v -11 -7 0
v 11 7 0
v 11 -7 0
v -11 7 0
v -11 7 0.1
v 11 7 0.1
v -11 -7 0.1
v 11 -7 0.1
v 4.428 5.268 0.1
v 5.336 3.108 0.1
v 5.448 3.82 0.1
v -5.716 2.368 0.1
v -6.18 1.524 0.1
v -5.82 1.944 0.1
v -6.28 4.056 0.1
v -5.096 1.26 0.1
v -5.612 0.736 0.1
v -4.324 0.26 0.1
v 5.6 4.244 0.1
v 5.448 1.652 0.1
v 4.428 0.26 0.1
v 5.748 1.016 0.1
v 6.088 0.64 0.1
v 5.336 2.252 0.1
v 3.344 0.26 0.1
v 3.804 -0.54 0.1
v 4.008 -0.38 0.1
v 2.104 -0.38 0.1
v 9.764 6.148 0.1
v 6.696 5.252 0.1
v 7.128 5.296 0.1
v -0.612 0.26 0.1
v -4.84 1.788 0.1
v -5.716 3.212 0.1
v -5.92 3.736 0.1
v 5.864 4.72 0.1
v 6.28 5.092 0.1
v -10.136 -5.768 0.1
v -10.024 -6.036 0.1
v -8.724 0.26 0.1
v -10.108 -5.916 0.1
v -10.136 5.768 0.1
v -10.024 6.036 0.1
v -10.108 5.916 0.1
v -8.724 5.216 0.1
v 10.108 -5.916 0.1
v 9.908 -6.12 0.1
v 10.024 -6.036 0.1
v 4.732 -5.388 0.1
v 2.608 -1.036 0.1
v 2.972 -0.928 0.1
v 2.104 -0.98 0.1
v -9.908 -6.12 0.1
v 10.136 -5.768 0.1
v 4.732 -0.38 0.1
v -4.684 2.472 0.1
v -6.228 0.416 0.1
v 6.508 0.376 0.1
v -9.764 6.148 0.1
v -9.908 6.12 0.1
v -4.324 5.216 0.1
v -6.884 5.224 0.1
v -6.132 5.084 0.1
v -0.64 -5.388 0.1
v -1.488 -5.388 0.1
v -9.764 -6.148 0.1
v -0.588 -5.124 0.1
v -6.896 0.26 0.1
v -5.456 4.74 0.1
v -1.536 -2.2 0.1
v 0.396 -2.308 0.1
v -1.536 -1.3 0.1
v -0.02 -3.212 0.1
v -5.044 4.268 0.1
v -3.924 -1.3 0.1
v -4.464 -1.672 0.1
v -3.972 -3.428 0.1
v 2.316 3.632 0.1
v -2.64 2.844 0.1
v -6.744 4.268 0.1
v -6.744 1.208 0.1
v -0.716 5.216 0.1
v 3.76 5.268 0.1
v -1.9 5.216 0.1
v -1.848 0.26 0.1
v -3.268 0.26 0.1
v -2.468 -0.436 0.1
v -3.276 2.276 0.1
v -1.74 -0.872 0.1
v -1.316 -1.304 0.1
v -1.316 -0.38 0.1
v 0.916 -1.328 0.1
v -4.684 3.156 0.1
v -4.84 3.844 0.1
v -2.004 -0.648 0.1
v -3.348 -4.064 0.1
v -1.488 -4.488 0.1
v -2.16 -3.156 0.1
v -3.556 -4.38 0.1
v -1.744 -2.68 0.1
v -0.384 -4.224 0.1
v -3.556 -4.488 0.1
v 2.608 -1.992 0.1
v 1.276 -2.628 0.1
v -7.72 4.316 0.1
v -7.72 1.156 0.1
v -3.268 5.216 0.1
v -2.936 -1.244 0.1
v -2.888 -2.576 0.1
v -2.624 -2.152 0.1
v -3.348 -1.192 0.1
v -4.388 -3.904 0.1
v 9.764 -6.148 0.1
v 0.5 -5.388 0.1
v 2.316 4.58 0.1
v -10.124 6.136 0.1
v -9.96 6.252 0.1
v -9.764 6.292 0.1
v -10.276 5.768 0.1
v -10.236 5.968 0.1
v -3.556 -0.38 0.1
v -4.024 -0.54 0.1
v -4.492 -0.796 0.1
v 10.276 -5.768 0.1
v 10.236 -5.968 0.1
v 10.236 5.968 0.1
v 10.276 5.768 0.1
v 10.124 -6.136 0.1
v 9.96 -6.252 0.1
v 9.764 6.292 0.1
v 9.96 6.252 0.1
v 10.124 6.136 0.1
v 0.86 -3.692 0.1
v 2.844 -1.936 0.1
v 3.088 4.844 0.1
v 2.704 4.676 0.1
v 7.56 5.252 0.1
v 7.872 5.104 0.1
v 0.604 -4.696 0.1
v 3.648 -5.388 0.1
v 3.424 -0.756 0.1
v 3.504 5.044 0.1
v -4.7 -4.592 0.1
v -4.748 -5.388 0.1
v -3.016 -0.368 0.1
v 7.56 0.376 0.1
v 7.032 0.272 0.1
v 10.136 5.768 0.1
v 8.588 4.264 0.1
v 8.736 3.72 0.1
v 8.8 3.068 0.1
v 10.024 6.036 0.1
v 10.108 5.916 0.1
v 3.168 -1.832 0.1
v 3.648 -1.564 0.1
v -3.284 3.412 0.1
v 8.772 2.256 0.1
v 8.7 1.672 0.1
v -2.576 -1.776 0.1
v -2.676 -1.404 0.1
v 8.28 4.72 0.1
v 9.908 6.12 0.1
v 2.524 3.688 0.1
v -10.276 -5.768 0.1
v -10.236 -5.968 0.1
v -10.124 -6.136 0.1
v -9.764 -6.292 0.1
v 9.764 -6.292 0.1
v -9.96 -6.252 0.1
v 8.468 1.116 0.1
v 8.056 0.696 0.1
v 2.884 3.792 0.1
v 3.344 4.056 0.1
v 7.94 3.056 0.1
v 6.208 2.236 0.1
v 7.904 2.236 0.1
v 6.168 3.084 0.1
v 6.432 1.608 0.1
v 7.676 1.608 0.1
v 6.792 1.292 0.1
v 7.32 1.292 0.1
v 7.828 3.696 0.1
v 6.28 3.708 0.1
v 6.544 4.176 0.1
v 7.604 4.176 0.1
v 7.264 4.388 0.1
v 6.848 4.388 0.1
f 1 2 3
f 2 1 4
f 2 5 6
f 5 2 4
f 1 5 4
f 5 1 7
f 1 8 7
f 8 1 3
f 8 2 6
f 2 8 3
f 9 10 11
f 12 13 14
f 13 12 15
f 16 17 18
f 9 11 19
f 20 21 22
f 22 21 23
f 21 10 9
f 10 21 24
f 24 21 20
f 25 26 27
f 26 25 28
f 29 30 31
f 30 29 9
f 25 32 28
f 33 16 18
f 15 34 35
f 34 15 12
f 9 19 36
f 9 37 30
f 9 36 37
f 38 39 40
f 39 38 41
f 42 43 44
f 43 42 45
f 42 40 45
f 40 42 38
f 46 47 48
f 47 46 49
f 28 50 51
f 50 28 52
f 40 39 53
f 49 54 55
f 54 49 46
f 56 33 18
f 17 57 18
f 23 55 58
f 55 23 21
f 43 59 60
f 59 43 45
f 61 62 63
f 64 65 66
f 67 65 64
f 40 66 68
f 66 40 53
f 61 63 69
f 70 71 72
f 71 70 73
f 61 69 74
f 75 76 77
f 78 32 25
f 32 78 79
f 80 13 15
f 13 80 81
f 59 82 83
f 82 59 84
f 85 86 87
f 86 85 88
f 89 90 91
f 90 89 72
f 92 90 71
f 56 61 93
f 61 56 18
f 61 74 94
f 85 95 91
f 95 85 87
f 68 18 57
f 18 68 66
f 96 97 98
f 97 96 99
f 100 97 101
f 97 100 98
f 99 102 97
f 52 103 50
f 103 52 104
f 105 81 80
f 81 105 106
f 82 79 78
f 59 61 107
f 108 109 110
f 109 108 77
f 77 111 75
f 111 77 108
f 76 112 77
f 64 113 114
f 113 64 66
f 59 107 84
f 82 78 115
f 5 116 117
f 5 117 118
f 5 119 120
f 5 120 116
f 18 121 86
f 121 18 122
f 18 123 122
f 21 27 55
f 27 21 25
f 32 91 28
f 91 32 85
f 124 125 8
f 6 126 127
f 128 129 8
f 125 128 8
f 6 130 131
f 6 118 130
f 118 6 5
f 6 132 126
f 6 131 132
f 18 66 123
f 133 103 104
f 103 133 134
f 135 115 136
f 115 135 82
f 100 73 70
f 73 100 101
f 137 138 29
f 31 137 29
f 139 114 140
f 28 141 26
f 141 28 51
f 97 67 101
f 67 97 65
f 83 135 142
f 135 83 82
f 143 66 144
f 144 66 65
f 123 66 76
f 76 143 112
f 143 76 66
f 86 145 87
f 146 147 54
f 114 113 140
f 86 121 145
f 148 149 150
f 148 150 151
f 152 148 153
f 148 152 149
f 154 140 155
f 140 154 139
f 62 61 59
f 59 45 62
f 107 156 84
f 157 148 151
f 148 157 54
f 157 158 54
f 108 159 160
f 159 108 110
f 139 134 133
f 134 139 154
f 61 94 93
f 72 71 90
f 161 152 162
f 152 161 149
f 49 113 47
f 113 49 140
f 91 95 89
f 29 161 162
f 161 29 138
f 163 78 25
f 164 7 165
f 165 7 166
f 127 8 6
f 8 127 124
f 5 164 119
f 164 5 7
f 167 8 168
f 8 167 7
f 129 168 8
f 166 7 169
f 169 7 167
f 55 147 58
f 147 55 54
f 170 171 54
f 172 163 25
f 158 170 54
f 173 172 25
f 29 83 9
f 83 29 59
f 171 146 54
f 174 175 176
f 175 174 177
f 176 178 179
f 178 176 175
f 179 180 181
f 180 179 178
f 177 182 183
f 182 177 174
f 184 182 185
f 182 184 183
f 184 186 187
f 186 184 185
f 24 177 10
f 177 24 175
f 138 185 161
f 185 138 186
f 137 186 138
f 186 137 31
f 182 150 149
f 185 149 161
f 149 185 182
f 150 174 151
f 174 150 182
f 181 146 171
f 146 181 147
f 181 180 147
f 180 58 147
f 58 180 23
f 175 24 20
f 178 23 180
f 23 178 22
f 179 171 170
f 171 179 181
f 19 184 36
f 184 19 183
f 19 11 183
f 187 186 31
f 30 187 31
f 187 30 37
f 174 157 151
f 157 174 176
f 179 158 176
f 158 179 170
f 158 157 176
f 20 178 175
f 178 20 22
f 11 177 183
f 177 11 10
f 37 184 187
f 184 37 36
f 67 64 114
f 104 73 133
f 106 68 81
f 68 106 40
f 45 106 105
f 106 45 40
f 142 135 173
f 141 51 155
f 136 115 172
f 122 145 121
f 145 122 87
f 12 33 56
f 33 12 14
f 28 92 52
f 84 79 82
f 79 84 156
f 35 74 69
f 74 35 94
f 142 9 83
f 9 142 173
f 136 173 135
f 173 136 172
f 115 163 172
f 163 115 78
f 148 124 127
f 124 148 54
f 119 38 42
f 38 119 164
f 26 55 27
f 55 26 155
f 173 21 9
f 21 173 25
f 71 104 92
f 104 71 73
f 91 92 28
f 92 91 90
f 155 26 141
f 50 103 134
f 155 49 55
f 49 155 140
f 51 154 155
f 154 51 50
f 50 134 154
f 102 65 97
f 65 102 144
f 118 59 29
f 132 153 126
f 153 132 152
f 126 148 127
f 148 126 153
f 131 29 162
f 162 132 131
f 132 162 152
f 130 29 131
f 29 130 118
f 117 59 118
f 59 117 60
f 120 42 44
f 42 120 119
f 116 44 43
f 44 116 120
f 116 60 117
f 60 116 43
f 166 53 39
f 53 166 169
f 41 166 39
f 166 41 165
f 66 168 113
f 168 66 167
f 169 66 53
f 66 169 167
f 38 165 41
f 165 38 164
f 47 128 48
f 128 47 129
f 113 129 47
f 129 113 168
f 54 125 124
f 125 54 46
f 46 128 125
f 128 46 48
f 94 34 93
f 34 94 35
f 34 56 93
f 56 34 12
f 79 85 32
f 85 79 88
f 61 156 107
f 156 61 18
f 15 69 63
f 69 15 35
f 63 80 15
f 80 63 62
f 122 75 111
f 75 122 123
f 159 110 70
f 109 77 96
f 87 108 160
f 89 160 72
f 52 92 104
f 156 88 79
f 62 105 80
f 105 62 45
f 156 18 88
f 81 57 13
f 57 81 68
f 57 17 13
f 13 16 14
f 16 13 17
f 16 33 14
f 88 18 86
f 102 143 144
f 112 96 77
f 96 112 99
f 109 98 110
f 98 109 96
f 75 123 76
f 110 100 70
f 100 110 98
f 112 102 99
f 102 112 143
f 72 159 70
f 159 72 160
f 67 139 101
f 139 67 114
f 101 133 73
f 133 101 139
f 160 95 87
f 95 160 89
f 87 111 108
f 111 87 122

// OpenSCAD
// file: ../p/box5-12.scad
use <../lib.scad>
function ldraw_lib__box5_12() = [
// 0 Box with 5 Faces without Any Edges
// 0 Name: box5-12.dat
// 0 Author: Chris Dee [cwdee]
// 0 !LDRAW_ORG Primitive UPDATE 2009-02
// 0 !LICENSE Licensed under CC BY 4.0 : see CAreadme.txt
// 
// 0 BFC CERTIFY CCW
  [0,"BFC","CERTIFY"],
  [0,"BFC","CCW"],
// 
// 0 !HISTORY 2009-09-03 [PTadmin] Official Update 2009-02
// 
// 
// 4 16 1 1 1 1 1 -1 -1 1 -1 -1 1 1
  [4,16,1,1,1,1,1,-1,-1,1,-1,-1,1,1],
// 4 16 -1 0 1 1 0 1 1 1 1 -1 1 1
  [4,16,-1,0,1,1,0,1,1,1,1,-1,1,1],
// 4 16 -1 0 -1 -1 0 1 -1 1 1 -1 1 -1
  [4,16,-1,0,-1,-1,0,1,-1,1,1,-1,1,-1],
// 4 16 1 0 -1 -1 0 -1 -1 1 -1 1 1 -1
  [4,16,1,0,-1,-1,0,-1,-1,1,-1,1,1,-1],
// 4 16 1 0 1 1 0 -1 1 1 -1 1 1 1
  [4,16,1,0,1,1,0,-1,1,1,-1,1,1,1],
// 0
];
module ldraw_lib__box5_12(step=0, col=false, unit=2/5, alt=false, line=0.2, solid=!$preview)
    makepoly(ldraw_lib__box5_12(), step=step, col=col, unit=unit, alt=alt, line=line, solid=solid);
ldraw_lib__box5_12(line=0.2);
// main file
use <../lib.scad>
use <../p/box5-12.scad>
function ldraw_lib__6296256o() = [
// 0 Sticker  1.8 x  2.8 with "DK 10 271" Licence Plate
// 0 Name: 6296256o.dat
// 0 Author: Magnus Forsberg [MagFors]
// 0 !LDRAW_ORG Part UPDATE 2022-05
// 0 !LICENSE Licensed under CC BY 4.0 : see CAreadme.txt
// 
// 0 BFC CERTIFY CCW
  [0,"BFC","CERTIFY"],
  [0,"BFC","CCW"],
// 
// 0 !KEYWORDS 500, Cinquecento, FIAT, Nuova, set 10271
// 
// 0 !HISTORY 2022-09-15 [PTadmin] Official Update 2022-05
// 
// 
// 1 16 0 -.25 0 27.5 0 0 0 .25 0 0 0 17.5 box5-12.dat
  [1,16,0,-.25,0,27.5,0,0,0,.25,0,0,0,17.5, ldraw_lib__box5_12()],
// 3 0 11.07 -.25 13.17 13.34 -.25 7.77 13.62 -.25 9.55
  [3,0,11.07,-.25,13.17,13.34,-.25,7.77,13.62,-.25,9.55],
// 4 0 -15.45 -.25 3.81 -14.55 -.25 4.86 -14.29 -.25 5.92 -15.7 -.25 10.14
  [4,0,-15.45,-.25,3.81,-14.55,-.25,4.86,-14.29,-.25,5.92,-15.7,-.25,10.14],
// 3 0 -12.74 -.25 3.15 -14.03 -.25 1.84 -10.81 -.25 .65
  [3,0,-12.74,-.25,3.15,-14.03,-.25,1.84,-10.81,-.25,.65],
// 3 0 11.07 -.25 13.17 13.62 -.25 9.55 14 -.25 10.61
  [3,0,11.07,-.25,13.17,13.62,-.25,9.55,14,-.25,10.61],
// 3 0 13.62 -.25 4.13 11.07 -.25 .65 14.37 -.25 2.54
  [3,0,13.62,-.25,4.13,11.07,-.25,.65,14.37,-.25,2.54],
// 3 0 14.37 -.25 2.54 11.07 -.25 .65 15.22 -.25 1.6
  [3,0,14.37,-.25,2.54,11.07,-.25,.65,15.22,-.25,1.6],
// 4 0 13.34 -.25 7.77 11.07 -.25 13.17 11.07 -.25 .65 13.34 -.25 5.63
  [4,0,13.34,-.25,7.77,11.07,-.25,13.17,11.07,-.25,.65,13.34,-.25,5.63],
// 3 0 13.34 -.25 5.63 11.07 -.25 .65 13.62 -.25 4.13
  [3,0,13.34,-.25,5.63,11.07,-.25,.65,13.62,-.25,4.13],
// 4 0 5.26 -.25 -.95 9.51 -.25 -1.35 10.02 -.25 -.95 8.36 -.25 .65
  [4,0,5.26,-.25,-.95,9.51,-.25,-1.35,10.02,-.25,-.95,8.36,-.25,.65],
// 4 0 24.41 -.25 15.37 11.07 -.25 13.17 16.74 -.25 13.13 17.82 -.25 13.24
  [4,0,24.41,-.25,15.37,11.07,-.25,13.17,16.74,-.25,13.13,17.82,-.25,13.24],
// 3 0 8.36 -.25 .65 -1.53 -.25 .65 5.26 -.25 -.95
  [3,0,8.36,-.25,.65,-1.53,-.25,.65,5.26,-.25,-.95],
// 3 0 -12.1 -.25 4.47 -12.74 -.25 3.15 -10.81 -.25 .65
  [3,0,-12.1,-.25,4.47,-12.74,-.25,3.15,-10.81,-.25,.65],
// 4 0 -14.29 -.25 8.03 -14.8 -.25 9.34 -15.7 -.25 10.14 -14.29 -.25 5.92
  [4,0,-14.29,-.25,8.03,-14.8,-.25,9.34,-15.7,-.25,10.14,-14.29,-.25,5.92],
// 3 0 11.07 -.25 13.17 14 -.25 10.61 14.66 -.25 11.8
  [3,0,11.07,-.25,13.17,14,-.25,10.61,14.66,-.25,11.8],
// 3 0 11.07 -.25 13.17 15.7 -.25 12.73 16.74 -.25 13.13
  [3,0,11.07,-.25,13.17,15.7,-.25,12.73,16.74,-.25,13.13],
// 3 0 11.07 -.25 13.17 14.66 -.25 11.8 15.7 -.25 12.73
  [3,0,11.07,-.25,13.17,14.66,-.25,11.8,15.7,-.25,12.73],
// 4 0 -21.81 -.25 .65 -25.34 -.25 -14.42 -25.27 -.25 -14.79 -25.06 -.25 -15.09
  [4,0,-21.81,-.25,.65,-25.34,-.25,-14.42,-25.27,-.25,-14.79,-25.06,-.25,-15.09],
// 4 0 -21.81 -.25 13.04 -25.06 -.25 15.09 -25.27 -.25 14.79 -25.34 -.25 14.42
  [4,0,-21.81,-.25,13.04,-25.06,-.25,15.09,-25.27,-.25,14.79,-25.34,-.25,14.42],
// 4 0 -21.81 -.25 13.04 -25.34 -.25 14.42 -25.34 -.25 -14.42 -21.81 -.25 .65
  [4,0,-21.81,-.25,13.04,-25.34,-.25,14.42,-25.34,-.25,-14.42,-21.81,-.25,.65],
// 4 0 25.06 -.25 -15.09 25.27 -.25 -14.79 11.83 -.25 -13.47 24.77 -.25 -15.3
  [4,0,25.06,-.25,-15.09,25.27,-.25,-14.79,11.83,-.25,-13.47,24.77,-.25,-15.3],
// 4 0 6.52 -.25 -2.59 7.43 -.25 -2.32 5.26 -.25 -.95 5.26 -.25 -2.45
  [4,0,6.52,-.25,-2.59,7.43,-.25,-2.32,5.26,-.25,-.95,5.26,-.25,-2.45],
// 3 0 -21.81 -.25 .65 -25.06 -.25 -15.09 -24.77 -.25 -15.3
  [3,0,-21.81,-.25,.65,-25.06,-.25,-15.09,-24.77,-.25,-15.3],
// 4 0 25.34 -.25 -14.42 11.83 -.25 -.95 11.83 -.25 -13.47 25.27 -.25 -14.79
  [4,0,25.34,-.25,-14.42,11.83,-.25,-.95,11.83,-.25,-13.47,25.27,-.25,-14.79],
// 3 0 -11.71 -.25 6.18 -12.1 -.25 4.47 -10.81 -.25 .65
  [3,0,-11.71,-.25,6.18,-12.1,-.25,4.47,-10.81,-.25,.65],
// 3 0 -14.03 -.25 1.84 -15.57 -.25 1.04 -10.81 -.25 .65
  [3,0,-14.03,-.25,1.84,-15.57,-.25,1.04,-10.81,-.25,.65],
// 4 0 16.27 -.25 .94 15.22 -.25 1.6 11.07 -.25 .65 11.83 -.25 -.95
  [4,0,16.27,-.25,.94,15.22,-.25,1.6,11.07,-.25,.65,11.83,-.25,-.95],
// 4 0 -21.81 -.25 13.04 -24.41 -.25 15.37 -24.77 -.25 15.3 -25.06 -.25 15.09
  [4,0,-21.81,-.25,13.04,-24.41,-.25,15.37,-24.77,-.25,15.3,-25.06,-.25,15.09],
// 3 0 -10.81 -.25 13.04 -17.21 -.25 13.06 -15.33 -.25 12.71
  [3,0,-10.81,-.25,13.04,-17.21,-.25,13.06,-15.33,-.25,12.71],
// 3 0 -1.6 -.25 -13.47 -3.72 -.25 -13.47 -24.41 -.25 -15.37
  [3,0,-1.6,-.25,-13.47,-3.72,-.25,-13.47,-24.41,-.25,-15.37],
// 3 0 -1.47 -.25 -12.81 -3.72 -.25 -13.47 -1.6 -.25 -13.47
  [3,0,-1.47,-.25,-12.81,-3.72,-.25,-13.47,-1.6,-.25,-13.47],
// 4 0 -24.41 -.25 -15.37 -17.24 -.25 .65 -21.81 -.25 .65 -24.77 -.25 -15.3
  [4,0,-24.41,-.25,-15.37,-17.24,-.25,.65,-21.81,-.25,.65,-24.77,-.25,-15.3],
// 3 0 -10.81 -.25 13.04 -15.33 -.25 12.71 -13.64 -.25 11.85
  [3,0,-10.81,-.25,13.04,-15.33,-.25,12.71,-13.64,-.25,11.85],
// 4 0 .99 -.25 -5.77 -3.84 -.25 -3.25 -3.84 -.25 -5.5 -.05 -.25 -8.03
  [4,0,.99,-.25,-5.77,-3.84,-.25,-3.25,-3.84,-.25,-5.5,-.05,-.25,-8.03],
// 3 0 -10.81 -.25 13.04 -13.64 -.25 11.85 -12.61 -.25 10.67
  [3,0,-10.81,-.25,13.04,-13.64,-.25,11.85,-12.61,-.25,10.67],
// 3 0 -9.81 -.25 -3.25 -11.16 -.25 -4.18 -9.93 -.25 -8.57
  [3,0,-9.81,-.25,-3.25,-11.16,-.25,-4.18,-9.93,-.25,-8.57],
// 4 0 8.36 -.25 .65 5.79 -.25 9.08 -6.6 -.25 7.11 -1.53 -.25 .65
  [4,0,8.36,-.25,.65,5.79,-.25,9.08,-6.6,-.25,7.11,-1.53,-.25,.65],
// 4 0 -15.45 -.25 3.81 -15.7 -.25 10.14 -16.86 -.25 10.67 -16.86 -.25 3.02
  [4,0,-15.45,-.25,3.81,-15.7,-.25,10.14,-16.86,-.25,10.67,-16.86,-.25,3.02],
// 4 0 -1.79 -.25 13.04 9.4 -.25 13.17 -24.41 -.25 15.37 -4.75 -.25 13.04
  [4,0,-1.79,-.25,13.04,9.4,-.25,13.17,-24.41,-.25,15.37,-4.75,-.25,13.04],
// 4 0 -4.62 -.25 .65 -8.19 -.25 5.69 -8.17 -.25 .65 -6.17 -.25 -1.09
  [4,0,-4.62,-.25,.65,-8.19,-.25,5.69,-8.17,-.25,.65,-6.17,-.25,-1.09],
// 4 0 -4.35 -.25 -2.18 -3.84 -.25 -3.25 -3.29 -.25 -3.26 -3.29 -.25 -.95
  [4,0,-4.35,-.25,-2.18,-3.84,-.25,-3.25,-3.29,-.25,-3.26,-3.29,-.25,-.95],
// 3 0 2.29 -.25 -3.32 -3.29 -.25 -3.26 .99 -.25 -5.77
  [3,0,2.29,-.25,-3.32,-3.29,-.25,-3.26,.99,-.25,-5.77],
// 4 0 -11.71 -.25 7.89 -11.71 -.25 6.18 -10.81 -.25 .65 -10.81 -.25 13.04
  [4,0,-11.71,-.25,7.89,-11.71,-.25,6.18,-10.81,-.25,.65,-10.81,-.25,13.04],
// 3 0 -10.81 -.25 13.04 -12.61 -.25 10.67 -12.1 -.25 9.61
  [3,0,-10.81,-.25,13.04,-12.61,-.25,10.67,-12.1,-.25,9.61],
// 4 0 -6.17 -.25 -1.09 -5.01 -.25 -1.62 -3.29 -.25 -.95 -4.62 -.25 .65
  [4,0,-6.17,-.25,-1.09,-5.01,-.25,-1.62,-3.29,-.25,-.95,-4.62,-.25,.65],
// 4 0 -10.81 -.25 .65 -15.57 -.25 1.04 -17.24 -.25 .65 -24.41 -.25 -15.37
  [4,0,-10.81,-.25,.65,-15.57,-.25,1.04,-17.24,-.25,.65,-24.41,-.25,-15.37],
// 4 0 -3.72 -.25 -11.22 -5.4 -.25 -7.89 -8.37 -.25 -10.16 -8.89 -.25 -10.95
  [4,0,-3.72,-.25,-11.22,-5.4,-.25,-7.89,-8.37,-.25,-10.16,-8.89,-.25,-10.95],
// 4 0 -4.36 -.25 -6.7 -5.4 -.25 -7.89 -3.72 -.25 -11.22 -.96 -.25 -10.56
  [4,0,-4.36,-.25,-6.7,-5.4,-.25,-7.89,-3.72,-.25,-11.22,-.96,-.25,-10.56],
// 3 0 -8.89 -.25 -10.95 -8.89 -.25 -11.22 -3.72 -.25 -11.22
  [3,0,-8.89,-.25,-10.95,-8.89,-.25,-11.22,-3.72,-.25,-11.22],
// 4 0 5.26 -.25 -2.45 3.19 -.25 -6.57 6.52 -.25 -4.98 6.52 -.25 -2.59
  [4,0,5.26,-.25,-2.45,3.19,-.25,-6.57,6.52,-.25,-4.98,6.52,-.25,-2.59],
// 4 0 -19.3 -.25 2.89 -16.86 -.25 3.02 -16.86 -.25 10.67 -19.3 -.25 10.79
  [4,0,-19.3,-.25,2.89,-16.86,-.25,3.02,-16.86,-.25,10.67,-19.3,-.25,10.79],
// 3 0 -1.79 -.25 13.04 -6.6 -.25 7.11 5.79 -.25 9.08
  [3,0,-1.79,-.25,13.04,-6.6,-.25,7.11,5.79,-.25,9.08],
// 3 0 -24.41 -.25 15.37 -10.81 -.25 13.04 -8.17 -.25 13.04
  [3,0,-24.41,-.25,15.37,-10.81,-.25,13.04,-8.17,-.25,13.04],
// 4 0 -7.34 -.25 -3.11 -9.93 -.25 -8.57 -7.22 -.25 -6.44 -6.56 -.25 -5.38
  [4,0,-7.34,-.25,-3.11,-9.93,-.25,-8.57,-7.22,-.25,-6.44,-6.56,-.25,-5.38],
// 4 0 -7.34 -.25 -3.11 -8.37 -.25 -2.98 -9.81 -.25 -3.25 -9.93 -.25 -8.57
  [4,0,-7.34,-.25,-3.11,-8.37,-.25,-2.98,-9.81,-.25,-3.25,-9.93,-.25,-8.57],
// 3 0 -11.16 -.25 -4.18 -10.97 -.25 -9.76 -9.93 -.25 -8.57
  [3,0,-11.16,-.25,-4.18,-10.97,-.25,-9.76,-9.93,-.25,-8.57],
// 4 0 -1.6 -.25 -13.47 -24.41 -.25 -15.37 24.41 -.25 -15.37 1.25 -.25 -13.47
  [4,0,-1.6,-.25,-13.47,-24.41,-.25,-15.37,24.41,-.25,-15.37,1.25,-.25,-13.47],
// 3 0 -24.41 -.25 15.37 -8.17 -.25 13.04 -4.75 -.25 13.04
  [3,0,-24.41,-.25,15.37,-8.17,-.25,13.04,-4.75,-.25,13.04],
// 3 0 -1.79 -.25 13.04 5.79 -.25 9.08 5.79 -.25 11.45
  [3,0,-1.79,-.25,13.04,5.79,-.25,9.08,5.79,-.25,11.45],
// 3 0 -27.5 -.25 17.5 -25.31 -.25 15.34 -24.9 -.25 15.63
  [3,0,-27.5,-.25,17.5,-25.31,-.25,15.34,-24.9,-.25,15.63],
// 3 0 -27.5 -.25 17.5 -24.9 -.25 15.63 -24.41 -.25 15.73
  [3,0,-27.5,-.25,17.5,-24.9,-.25,15.63,-24.41,-.25,15.73],
// 3 0 -27.5 -.25 17.5 -25.69 -.25 14.42 -25.59 -.25 14.92
  [3,0,-27.5,-.25,17.5,-25.69,-.25,14.42,-25.59,-.25,14.92],
// 3 0 -27.5 -.25 17.5 -25.59 -.25 14.92 -25.31 -.25 15.34
  [3,0,-27.5,-.25,17.5,-25.59,-.25,14.92,-25.31,-.25,15.34],
// 4 0 -8.89 -.25 -.95 -8.17 -.25 .65 -10.81 -.25 .65 -10.06 -.25 -1.35
  [4,0,-8.89,-.25,-.95,-8.17,-.25,.65,-10.81,-.25,.65,-10.06,-.25,-1.35],
// 3 0 -10.81 -.25 .65 -11.23 -.25 -1.99 -10.06 -.25 -1.35
  [3,0,-10.81,-.25,.65,-11.23,-.25,-1.99,-10.06,-.25,-1.35],
// 4 0 10.02 -.25 -.95 11.83 -.25 -.95 11.07 -.25 .65 8.36 -.25 .65
  [4,0,10.02,-.25,-.95,11.83,-.25,-.95,11.07,-.25,.65,8.36,-.25,.65],
// 4 0 -3.29 -.25 -.95 5.26 -.25 -.95 -1.53 -.25 .65 -4.62 -.25 .65
  [4,0,-3.29,-.25,-.95,5.26,-.25,-.95,-1.53,-.25,.65,-4.62,-.25,.65],
// 3 0 25.69 -.25 -14.42 25.59 -.25 -14.92 27.5 -.25 -17.5
  [3,0,25.69,-.25,-14.42,25.59,-.25,-14.92,27.5,-.25,-17.5],
// 3 0 27.5 -.25 17.5 25.59 -.25 14.92 25.69 -.25 14.42
  [3,0,27.5,-.25,17.5,25.59,-.25,14.92,25.69,-.25,14.42],
// 3 0 25.31 -.25 -15.34 24.9 -.25 -15.63 27.5 -.25 -17.5
  [3,0,25.31,-.25,-15.34,24.9,-.25,-15.63,27.5,-.25,-17.5],
// 3 0 25.59 -.25 -14.92 25.31 -.25 -15.34 27.5 -.25 -17.5
  [3,0,25.59,-.25,-14.92,25.31,-.25,-15.34,27.5,-.25,-17.5],
// 3 0 27.5 -.25 17.5 24.41 -.25 15.73 24.9 -.25 15.63
  [3,0,27.5,-.25,17.5,24.41,-.25,15.73,24.9,-.25,15.63],
// 4 0 24.41 -.25 15.73 27.5 -.25 17.5 -27.5 -.25 17.5 -24.41 -.25 15.73
  [4,0,24.41,-.25,15.73,27.5,-.25,17.5,-27.5,-.25,17.5,-24.41,-.25,15.73],
// 3 0 27.5 -.25 17.5 25.31 -.25 15.34 25.59 -.25 14.92
  [3,0,27.5,-.25,17.5,25.31,-.25,15.34,25.59,-.25,14.92],
// 3 0 27.5 -.25 17.5 24.9 -.25 15.63 25.31 -.25 15.34
  [3,0,27.5,-.25,17.5,24.9,-.25,15.63,25.31,-.25,15.34],
// 3 0 -10.81 -.25 .65 -24.41 -.25 -15.37 -11.23 -.25 -1.99
  [3,0,-10.81,-.25,.65,-24.41,-.25,-15.37,-11.23,-.25,-1.99],
// 4 0 7.11 -.25 -4.84 6.52 -.25 -4.98 3.19 -.25 -6.57 2.15 -.25 -9.23
  [4,0,7.11,-.25,-4.84,6.52,-.25,-4.98,3.19,-.25,-6.57,2.15,-.25,-9.23],
// 4 0 6.76 -.25 11.69 7.72 -.25 12.11 -1.79 -.25 13.04 5.79 -.25 11.45
  [4,0,6.76,-.25,11.69,7.72,-.25,12.11,-1.79,-.25,13.04,5.79,-.25,11.45],
// 4 0 -4.36 -.25 -6.7 -.96 -.25 -10.56 -.05 -.25 -8.03 -3.84 -.25 -5.5
  [4,0,-4.36,-.25,-6.7,-.96,-.25,-10.56,-.05,-.25,-8.03,-3.84,-.25,-5.5],
// 3 0 18.9 -.25 13.13 19.68 -.25 12.76 24.41 -.25 15.37
  [3,0,18.9,-.25,13.13,19.68,-.25,12.76,24.41,-.25,15.37],
// 3 0 17.82 -.25 13.24 18.9 -.25 13.13 24.41 -.25 15.37
  [3,0,17.82,-.25,13.24,18.9,-.25,13.13,24.41,-.25,15.37],
// 3 0 1.51 -.25 -11.74 1.25 -.25 -13.47 9.12 -.25 -13.47
  [3,0,1.51,-.25,-11.74,1.25,-.25,-13.47,9.12,-.25,-13.47],
// 4 0 5.26 -.25 -.95 7.43 -.25 -2.32 8.56 -.25 -1.89 9.51 -.25 -1.35
  [4,0,5.26,-.25,-.95,7.43,-.25,-2.32,8.56,-.25,-1.89,9.51,-.25,-1.35],
// 4 0 -1.47 -.25 -12.81 -.96 -.25 -10.56 -3.72 -.25 -11.22 -3.72 -.25 -13.47
  [4,0,-1.47,-.25,-12.81,-.96,-.25,-10.56,-3.72,-.25,-11.22,-3.72,-.25,-13.47],
// 4 0 8.76 -.25 12.61 9.4 -.25 13.17 -1.79 -.25 13.04 7.72 -.25 12.11
  [4,0,8.76,-.25,12.61,9.4,-.25,13.17,-1.79,-.25,13.04,7.72,-.25,12.11],
// 3 0 -11.75 -.25 -11.48 -24.41 -.25 -15.37 -11.87 -.25 -13.47
  [3,0,-11.75,-.25,-11.48,-24.41,-.25,-15.37,-11.87,-.25,-13.47],
// 3 0 -11.87 -.25 -13.47 -24.41 -.25 -15.37 -3.72 -.25 -13.47
  [3,0,-11.87,-.25,-13.47,-24.41,-.25,-15.37,-3.72,-.25,-13.47],
// 3 0 -11.23 -.25 -1.99 -24.41 -.25 -15.37 -11.16 -.25 -4.18
  [3,0,-11.23,-.25,-1.99,-24.41,-.25,-15.37,-11.16,-.25,-4.18],
// 4 0 -10.97 -.25 -9.76 -11.16 -.25 -4.18 -24.41 -.25 -15.37 -11.75 -.25 -11.48
  [4,0,-10.97,-.25,-9.76,-11.16,-.25,-4.18,-24.41,-.25,-15.37,-11.75,-.25,-11.48],
// 3 0 -8.17 -.25 .65 -7.54 -.25 -.92 -6.17 -.25 -1.09
  [3,0,-8.17,-.25,.65,-7.54,-.25,-.92,-6.17,-.25,-1.09],
// 3 0 18.9 -.25 .94 17.58 -.25 .68 25.34 -.25 -14.42
  [3,0,18.9,-.25,.94,17.58,-.25,.68,25.34,-.25,-14.42],
// 3 0 1.25 -.25 -13.47 24.41 -.25 -15.37 9.12 -.25 -13.47
  [3,0,1.25,-.25,-13.47,24.41,-.25,-15.37,9.12,-.25,-13.47],
// 3 0 -8.17 -.25 .65 -8.89 -.25 -.95 -7.54 -.25 -.92
  [3,0,-8.17,-.25,.65,-8.89,-.25,-.95,-7.54,-.25,-.92],
// 3 0 25.34 -.25 14.42 21.47 -.25 10.66 21.84 -.25 9.3
  [3,0,25.34,-.25,14.42,21.47,-.25,10.66,21.84,-.25,9.3],
// 3 0 25.34 -.25 14.42 21.84 -.25 9.3 22 -.25 7.67
  [3,0,25.34,-.25,14.42,21.84,-.25,9.3,22,-.25,7.67],
// 4 0 25.27 -.25 14.79 25.06 -.25 15.09 21.47 -.25 10.66 25.34 -.25 14.42
  [4,0,25.27,-.25,14.79,25.06,-.25,15.09,21.47,-.25,10.66,25.34,-.25,14.42],
// 4 0 1.51 -.25 -11.74 9.12 -.25 -13.47 9.12 -.25 -3.91 7.92 -.25 -4.58
  [4,0,1.51,-.25,-11.74,9.12,-.25,-13.47,9.12,-.25,-3.91,7.92,-.25,-4.58],
// 3 0 -17.21 -.25 13.06 -10.81 -.25 13.04 -24.41 -.25 15.37
  [3,0,-17.21,-.25,13.06,-10.81,-.25,13.04,-24.41,-.25,15.37],
// 3 0 -24.41 -.25 15.37 -21.81 -.25 13.04 -17.21 -.25 13.06
  [3,0,-24.41,-.25,15.37,-21.81,-.25,13.04,-17.21,-.25,13.06],
// 3 0 -8.17 -.25 13.04 -8.21 -.25 8.53 -4.75 -.25 13.04
  [3,0,-8.17,-.25,13.04,-8.21,-.25,8.53,-4.75,-.25,13.04],
// 4 0 25.34 -.25 14.42 22 -.25 7.67 21.93 -.25 5.64 25.34 -.25 -14.42
  [4,0,25.34,-.25,14.42,22,-.25,7.67,21.93,-.25,5.64,25.34,-.25,-14.42],
// 3 0 21.93 -.25 5.64 21.75 -.25 4.18 25.34 -.25 -14.42
  [3,0,21.93,-.25,5.64,21.75,-.25,4.18,25.34,-.25,-14.42],
// 4 0 -6.44 -.25 -4.44 -6.69 -.25 -3.51 -7.34 -.25 -3.11 -6.56 -.25 -5.38
  [4,0,-6.44,-.25,-4.44,-6.69,-.25,-3.51,-7.34,-.25,-3.11,-6.56,-.25,-5.38],
// 4 0 2.15 -.25 -9.23 1.51 -.25 -11.74 7.92 -.25 -4.58 7.11 -.25 -4.84
  [4,0,2.15,-.25,-9.23,1.51,-.25,-11.74,7.92,-.25,-4.58,7.11,-.25,-4.84],
// 3 0 -10.81 -.25 13.04 -12.1 -.25 9.61 -11.71 -.25 7.89
  [3,0,-10.81,-.25,13.04,-12.1,-.25,9.61,-11.71,-.25,7.89],
// 3 0 -3.84 -.25 -3.25 .99 -.25 -5.77 -3.29 -.25 -3.26
  [3,0,-3.84,-.25,-3.25,.99,-.25,-5.77,-3.29,-.25,-3.26],
// 4 0 25.06 -.25 15.09 24.77 -.25 15.3 20.7 -.25 11.8 21.47 -.25 10.66
  [4,0,25.06,-.25,15.09,24.77,-.25,15.3,20.7,-.25,11.8,21.47,-.25,10.66],
// 4 0 11.83 -.25 -13.47 9.12 -.25 -13.47 24.41 -.25 -15.37 24.77 -.25 -15.3
  [4,0,11.83,-.25,-13.47,9.12,-.25,-13.47,24.41,-.25,-15.37,24.77,-.25,-15.3],
// 3 0 -3.29 -.25 -.95 -5.01 -.25 -1.62 -4.35 -.25 -2.18
  [3,0,-3.29,-.25,-.95,-5.01,-.25,-1.62,-4.35,-.25,-2.18],
// 4 0 24.41 -.25 15.37 19.68 -.25 12.76 20.7 -.25 11.8 24.77 -.25 15.3
  [4,0,24.41,-.25,15.37,19.68,-.25,12.76,20.7,-.25,11.8,24.77,-.25,15.3],
// 3 0 6.31 -.25 9.22 5.79 -.25 9.08 8.36 -.25 .65
  [3,0,6.31,-.25,9.22,5.79,-.25,9.08,8.36,-.25,.65],
// 3 0 -25.69 -.25 -14.42 -27.5 -.25 -17.5 -25.59 -.25 -14.92
  [3,0,-25.69,-.25,-14.42,-27.5,-.25,-17.5,-25.59,-.25,-14.92],
// 3 0 -25.59 -.25 -14.92 -27.5 -.25 -17.5 -25.31 -.25 -15.34
  [3,0,-25.59,-.25,-14.92,-27.5,-.25,-17.5,-25.31,-.25,-15.34],
// 4 0 25.69 -.25 14.42 25.69 -.25 -14.42 27.5 -.25 -17.5 27.5 -.25 17.5
  [4,0,25.69,-.25,14.42,25.69,-.25,-14.42,27.5,-.25,-17.5,27.5,-.25,17.5],
// 4 0 -25.69 -.25 -14.42 -25.69 -.25 14.42 -27.5 -.25 17.5 -27.5 -.25 -17.5
  [4,0,-25.69,-.25,-14.42,-25.69,-.25,14.42,-27.5,-.25,17.5,-27.5,-.25,-17.5],
// 4 0 -27.5 -.25 -17.5 27.5 -.25 -17.5 24.41 -.25 -15.73 -24.41 -.25 -15.73
  [4,0,-27.5,-.25,-17.5,27.5,-.25,-17.5,24.41,-.25,-15.73,-24.41,-.25,-15.73],
// 3 0 24.9 -.25 -15.63 24.41 -.25 -15.73 27.5 -.25 -17.5
  [3,0,24.9,-.25,-15.63,24.41,-.25,-15.73,27.5,-.25,-17.5],
// 3 0 -25.31 -.25 -15.34 -27.5 -.25 -17.5 -24.9 -.25 -15.63
  [3,0,-25.31,-.25,-15.34,-27.5,-.25,-17.5,-24.9,-.25,-15.63],
// 3 0 -24.9 -.25 -15.63 -27.5 -.25 -17.5 -24.41 -.25 -15.73
  [3,0,-24.9,-.25,-15.63,-27.5,-.25,-17.5,-24.41,-.25,-15.73],
// 4 0 16.27 -.25 .94 11.83 -.25 -.95 25.34 -.25 -14.42 17.58 -.25 .68
  [4,0,16.27,-.25,.94,11.83,-.25,-.95,25.34,-.25,-14.42,17.58,-.25,.68],
// 3 0 21.17 -.25 2.79 20.14 -.25 1.74 25.34 -.25 -14.42
  [3,0,21.17,-.25,2.79,20.14,-.25,1.74,25.34,-.25,-14.42],
// 3 0 7.21 -.25 9.48 6.31 -.25 9.22 8.36 -.25 .65
  [3,0,7.21,-.25,9.48,6.31,-.25,9.22,8.36,-.25,.65],
// 3 0 21.75 -.25 4.18 21.17 -.25 2.79 25.34 -.25 -14.42
  [3,0,21.75,-.25,4.18,21.17,-.25,2.79,25.34,-.25,-14.42],
// 3 0 8.36 -.25 10.14 7.21 -.25 9.48 8.36 -.25 .65
  [3,0,8.36,-.25,10.14,7.21,-.25,9.48,8.36,-.25,.65],
// 4 0 11.07 -.25 13.17 24.41 -.25 15.37 -24.41 -.25 15.37 9.4 -.25 13.17
  [4,0,11.07,-.25,13.17,24.41,-.25,15.37,-24.41,-.25,15.37,9.4,-.25,13.17],
// 3 0 20.14 -.25 1.74 18.9 -.25 .94 25.34 -.25 -14.42
  [3,0,20.14,-.25,1.74,18.9,-.25,.94,25.34,-.25,-14.42],
// 4 0 19.85 -.25 7.64 15.42 -.25 7.71 15.52 -.25 5.59 19.76 -.25 5.59
  [4,0,19.85,-.25,7.64,15.42,-.25,7.71,15.52,-.25,5.59,19.76,-.25,5.59],
// 4 0 19.76 -.25 5.59 15.52 -.25 5.59 16.08 -.25 4.02 19.19 -.25 4.02
  [4,0,19.76,-.25,5.59,15.52,-.25,5.59,16.08,-.25,4.02,19.19,-.25,4.02],
// 4 0 16.98 -.25 3.23 18.3 -.25 3.23 19.19 -.25 4.02 16.08 -.25 4.02
  [4,0,16.98,-.25,3.23,18.3,-.25,3.23,19.19,-.25,4.02,16.08,-.25,4.02],
// 4 0 15.42 -.25 7.71 19.85 -.25 7.64 19.57 -.25 9.24 15.7 -.25 9.27
  [4,0,15.42,-.25,7.71,19.85,-.25,7.64,19.57,-.25,9.24,15.7,-.25,9.27],
// 4 0 16.36 -.25 10.44 15.7 -.25 9.27 19.57 -.25 9.24 19.01 -.25 10.44
  [4,0,16.36,-.25,10.44,15.7,-.25,9.27,19.57,-.25,9.24,19.01,-.25,10.44],
// 4 0 17.12 -.25 10.97 16.36 -.25 10.44 19.01 -.25 10.44 18.16 -.25 10.97
  [4,0,17.12,-.25,10.97,16.36,-.25,10.44,19.01,-.25,10.44,18.16,-.25,10.97],
// 4 15 15.52 -.25 5.59 15.42 -.25 7.71 13.34 -.25 7.77 13.34 -.25 5.63
  [4,15,15.52,-.25,5.59,15.42,-.25,7.71,13.34,-.25,7.77,13.34,-.25,5.63],
// 4 15 20.7 -.25 11.8 19.68 -.25 12.76 18.16 -.25 10.97 19.01 -.25 10.44
  [4,15,20.7,-.25,11.8,19.68,-.25,12.76,18.16,-.25,10.97,19.01,-.25,10.44],
// 4 15 17.82 -.25 13.24 18.16 -.25 10.97 19.68 -.25 12.76 18.9 -.25 13.13
  [4,15,17.82,-.25,13.24,18.16,-.25,10.97,19.68,-.25,12.76,18.9,-.25,13.13],
// 3 15 19.57 -.25 9.24 21.84 -.25 9.3 21.47 -.25 10.66
  [3,15,19.57,-.25,9.24,21.84,-.25,9.3,21.47,-.25,10.66],
// 4 15 21.47 -.25 10.66 20.7 -.25 11.8 19.01 -.25 10.44 19.57 -.25 9.24
  [4,15,21.47,-.25,10.66,20.7,-.25,11.8,19.01,-.25,10.44,19.57,-.25,9.24],
// 4 15 22 -.25 7.67 21.84 -.25 9.3 19.57 -.25 9.24 19.85 -.25 7.64
  [4,15,22,-.25,7.67,21.84,-.25,9.3,19.57,-.25,9.24,19.85,-.25,7.64],
// 4 15 20.14 -.25 1.74 18.3 -.25 3.23 17.58 -.25 .68 18.9 -.25 .94
  [4,15,20.14,-.25,1.74,18.3,-.25,3.23,17.58,-.25,.68,18.9,-.25,.94],
// 3 15 18.3 -.25 3.23 16.98 -.25 3.23 17.58 -.25 .68
  [3,15,18.3,-.25,3.23,16.98,-.25,3.23,17.58,-.25,.68],
// 4 15 17.58 -.25 .68 16.98 -.25 3.23 15.22 -.25 1.6 16.27 -.25 .94
  [4,15,17.58,-.25,.68,16.98,-.25,3.23,15.22,-.25,1.6,16.27,-.25,.94],
// 3 15 15.52 -.25 5.59 13.34 -.25 5.63 13.62 -.25 4.13
  [3,15,15.52,-.25,5.59,13.34,-.25,5.63,13.62,-.25,4.13],
// 4 15 15.22 -.25 1.6 16.98 -.25 3.23 16.08 -.25 4.02 14.37 -.25 2.54
  [4,15,15.22,-.25,1.6,16.98,-.25,3.23,16.08,-.25,4.02,14.37,-.25,2.54],
// 4 15 18.3 -.25 3.23 20.14 -.25 1.74 21.17 -.25 2.79 19.19 -.25 4.02
  [4,15,18.3,-.25,3.23,20.14,-.25,1.74,21.17,-.25,2.79,19.19,-.25,4.02],
// 4 15 16.36 -.25 10.44 14.66 -.25 11.8 14 -.25 10.61 15.7 -.25 9.27
  [4,15,16.36,-.25,10.44,14.66,-.25,11.8,14,-.25,10.61,15.7,-.25,9.27],
// 3 15 14 -.25 10.61 13.62 -.25 9.55 15.7 -.25 9.27
  [3,15,14,-.25,10.61,13.62,-.25,9.55,15.7,-.25,9.27],
// 3 15 17.12 -.25 10.97 18.16 -.25 10.97 17.82 -.25 13.24
  [3,15,17.12,-.25,10.97,18.16,-.25,10.97,17.82,-.25,13.24],
// 4 15 17.82 -.25 13.24 16.74 -.25 13.13 15.7 -.25 12.73 17.12 -.25 10.97
  [4,15,17.82,-.25,13.24,16.74,-.25,13.13,15.7,-.25,12.73,17.12,-.25,10.97],
// 4 15 19.85 -.25 7.64 19.76 -.25 5.59 21.93 -.25 5.64 22 -.25 7.67
  [4,15,19.85,-.25,7.64,19.76,-.25,5.59,21.93,-.25,5.64,22,-.25,7.67],
// 4 15 19.19 -.25 4.02 21.17 -.25 2.79 21.75 -.25 4.18 19.76 -.25 5.59
  [4,15,19.19,-.25,4.02,21.17,-.25,2.79,21.75,-.25,4.18,19.76,-.25,5.59],
// 3 15 21.75 -.25 4.18 21.93 -.25 5.64 19.76 -.25 5.59
  [3,15,21.75,-.25,4.18,21.93,-.25,5.64,19.76,-.25,5.59],
// 4 15 13.62 -.25 4.13 14.37 -.25 2.54 16.08 -.25 4.02 15.52 -.25 5.59
  [4,15,13.62,-.25,4.13,14.37,-.25,2.54,16.08,-.25,4.02,15.52,-.25,5.59],
// 4 15 13.34 -.25 7.77 15.42 -.25 7.71 15.7 -.25 9.27 13.62 -.25 9.55
  [4,15,13.34,-.25,7.77,15.42,-.25,7.71,15.7,-.25,9.27,13.62,-.25,9.55],
// 4 15 14.66 -.25 11.8 16.36 -.25 10.44 17.12 -.25 10.97 15.7 -.25 12.73
  [4,15,14.66,-.25,11.8,16.36,-.25,10.44,17.12,-.25,10.97,15.7,-.25,12.73],
// 3 15 -1.47 -.25 -12.81 -1.6 -.25 -13.47 1.25 -.25 -13.47
  [3,15,-1.47,-.25,-12.81,-1.6,-.25,-13.47,1.25,-.25,-13.47],
// 3 15 3.19 -.25 -6.57 -.05 -.25 -8.03 2.15 -.25 -9.23
  [3,15,3.19,-.25,-6.57,-.05,-.25,-8.03,2.15,-.25,-9.23],
// 4 15 -19.3 -.25 2.89 -21.81 -.25 .65 -17.24 -.25 .65 -16.86 -.25 3.02
  [4,15,-19.3,-.25,2.89,-21.81,-.25,.65,-17.24,-.25,.65,-16.86,-.25,3.02],
// 4 15 -21.81 -.25 13.04 -21.81 -.25 .65 -19.3 -.25 2.89 -19.3 -.25 10.79
  [4,15,-21.81,-.25,13.04,-21.81,-.25,.65,-19.3,-.25,2.89,-19.3,-.25,10.79],
// 3 15 8.76 -.25 12.61 7.72 -.25 12.11 8.36 -.25 10.14
  [3,15,8.76,-.25,12.61,7.72,-.25,12.11,8.36,-.25,10.14],
// 3 15 8.56 -.25 -1.89 7.43 -.25 -2.32 9.12 -.25 -3.91
  [3,15,8.56,-.25,-1.89,7.43,-.25,-2.32,9.12,-.25,-3.91],
// 3 15 6.76 -.25 11.69 5.79 -.25 11.45 7.21 -.25 9.48
  [3,15,6.76,-.25,11.69,5.79,-.25,11.45,7.21,-.25,9.48],
// 4 15 -7.54 -.25 -.92 -8.89 -.25 -.95 -10.06 -.25 -1.35 -6.17 -.25 -1.09
  [4,15,-7.54,-.25,-.92,-8.89,-.25,-.95,-10.06,-.25,-1.35,-6.17,-.25,-1.09],
// 4 15 -14.55 -.25 4.86 -12.1 -.25 4.47 -11.71 -.25 6.18 -14.29 -.25 5.92
  [4,15,-14.55,-.25,4.86,-12.1,-.25,4.47,-11.71,-.25,6.18,-14.29,-.25,5.92],
// 3 15 5.26 -.25 -.95 2.29 -.25 -3.32 5.26 -.25 -2.45
  [3,15,5.26,-.25,-.95,2.29,-.25,-3.32,5.26,-.25,-2.45],
// 4 15 -6.6 -.25 7.11 -1.79 -.25 13.04 -4.75 -.25 13.04 -8.21 -.25 8.53
  [4,15,-6.6,-.25,7.11,-1.79,-.25,13.04,-4.75,-.25,13.04,-8.21,-.25,8.53],
// 4 15 -13.64 -.25 11.85 -14.8 -.25 9.34 -12.1 -.25 9.61 -12.61 -.25 10.67
  [4,15,-13.64,-.25,11.85,-14.8,-.25,9.34,-12.1,-.25,9.61,-12.61,-.25,10.67],
// 4 15 8.36 -.25 10.14 11.07 -.25 13.17 9.4 -.25 13.17 8.76 -.25 12.61
  [4,15,8.36,-.25,10.14,11.07,-.25,13.17,9.4,-.25,13.17,8.76,-.25,12.61],
// 4 15 7.21 -.25 9.48 8.36 -.25 10.14 7.72 -.25 12.11 6.76 -.25 11.69
  [4,15,7.21,-.25,9.48,8.36,-.25,10.14,7.72,-.25,12.11,6.76,-.25,11.69],
// 4 15 6.31 -.25 9.22 7.21 -.25 9.48 5.79 -.25 11.45 5.79 -.25 9.08
  [4,15,6.31,-.25,9.22,7.21,-.25,9.48,5.79,-.25,11.45,5.79,-.25,9.08],
// 4 15 25.34 -.25 14.42 25.34 -.25 -14.42 25.69 -.25 -14.42 25.69 -.25 14.42
  [4,15,25.34,-.25,14.42,25.34,-.25,-14.42,25.69,-.25,-14.42,25.69,-.25,14.42],
// 4 15 -25.69 -.25 14.42 -25.69 -.25 -14.42 -25.34 -.25 -14.42 -25.34 -.25 14.42
  [4,15,-25.69,-.25,14.42,-25.69,-.25,-14.42,-25.34,-.25,-14.42,-25.34,-.25,14.42],
// 4 15 11.83 -.25 -.95 10.02 -.25 -.95 9.51 -.25 -1.35 9.12 -.25 -3.91
  [4,15,11.83,-.25,-.95,10.02,-.25,-.95,9.51,-.25,-1.35,9.12,-.25,-3.91],
// 4 15 8.36 -.25 10.14 8.36 -.25 .65 11.07 -.25 .65 11.07 -.25 13.17
  [4,15,8.36,-.25,10.14,8.36,-.25,.65,11.07,-.25,.65,11.07,-.25,13.17],
// 4 15 3.19 -.25 -6.57 2.29 -.25 -3.32 .99 -.25 -5.77 -.05 -.25 -8.03
  [4,15,3.19,-.25,-6.57,2.29,-.25,-3.32,.99,-.25,-5.77,-.05,-.25,-8.03],
// 4 15 -3.29 -.25 -3.26 2.29 -.25 -3.32 5.26 -.25 -.95 -3.29 -.25 -.95
  [4,15,-3.29,-.25,-3.26,2.29,-.25,-3.32,5.26,-.25,-.95,-3.29,-.25,-.95],
// 3 15 9.12 -.25 -3.91 9.51 -.25 -1.35 8.56 -.25 -1.89
  [3,15,9.12,-.25,-3.91,9.51,-.25,-1.35,8.56,-.25,-1.89],
// 3 15 6.52 -.25 -2.59 6.52 -.25 -4.98 7.11 -.25 -4.84
  [3,15,6.52,-.25,-2.59,6.52,-.25,-4.98,7.11,-.25,-4.84],
// 4 15 9.12 -.25 -3.91 9.12 -.25 -13.47 11.83 -.25 -13.47 11.83 -.25 -.95
  [4,15,9.12,-.25,-3.91,9.12,-.25,-13.47,11.83,-.25,-13.47,11.83,-.25,-.95],
// 4 15 7.92 -.25 -4.58 9.12 -.25 -3.91 7.43 -.25 -2.32 6.52 -.25 -2.59
  [4,15,7.92,-.25,-4.58,9.12,-.25,-3.91,7.43,-.25,-2.32,6.52,-.25,-2.59],
// 3 15 6.52 -.25 -2.59 7.11 -.25 -4.84 7.92 -.25 -4.58
  [3,15,6.52,-.25,-2.59,7.11,-.25,-4.84,7.92,-.25,-4.58],
// 4 15 -3.72 -.25 -13.47 -3.72 -.25 -11.22 -8.89 -.25 -11.22 -11.87 -.25 -13.47
  [4,15,-3.72,-.25,-13.47,-3.72,-.25,-11.22,-8.89,-.25,-11.22,-11.87,-.25,-13.47],
// 3 15 -24.41 -.25 15.73 -24.41 -.25 15.37 24.41 -.25 15.37
  [3,15,-24.41,-.25,15.73,-24.41,-.25,15.37,24.41,-.25,15.37],
// 4 15 25.06 -.25 15.09 25.27 -.25 14.79 25.59 -.25 14.92 25.31 -.25 15.34
  [4,15,25.06,-.25,15.09,25.27,-.25,14.79,25.59,-.25,14.92,25.31,-.25,15.34],
// 4 15 25.27 -.25 14.79 25.34 -.25 14.42 25.69 -.25 14.42 25.59 -.25 14.92
  [4,15,25.27,-.25,14.79,25.34,-.25,14.42,25.69,-.25,14.42,25.59,-.25,14.92],
// 3 15 24.9 -.25 15.63 24.41 -.25 15.37 24.77 -.25 15.3
  [3,15,24.9,-.25,15.63,24.41,-.25,15.37,24.77,-.25,15.3],
// 4 15 24.77 -.25 15.3 25.06 -.25 15.09 25.31 -.25 15.34 24.9 -.25 15.63
  [4,15,24.77,-.25,15.3,25.06,-.25,15.09,25.31,-.25,15.34,24.9,-.25,15.63],
// 4 15 24.41 -.25 15.73 -24.41 -.25 15.73 24.41 -.25 15.37 24.9 -.25 15.63
  [4,15,24.41,-.25,15.73,-24.41,-.25,15.73,24.41,-.25,15.37,24.9,-.25,15.63],
// 4 15 -24.77 -.25 15.3 -24.41 -.25 15.37 -24.41 -.25 15.73 -24.9 -.25 15.63
  [4,15,-24.77,-.25,15.3,-24.41,-.25,15.37,-24.41,-.25,15.73,-24.9,-.25,15.63],
// 4 15 -25.34 -.25 14.42 -25.27 -.25 14.79 -25.59 -.25 14.92 -25.69 -.25 14.42
  [4,15,-25.34,-.25,14.42,-25.27,-.25,14.79,-25.59,-.25,14.92,-25.69,-.25,14.42],
// 4 15 -25.27 -.25 14.79 -25.06 -.25 15.09 -25.31 -.25 15.34 -25.59 -.25 14.92
  [4,15,-25.27,-.25,14.79,-25.06,-.25,15.09,-25.31,-.25,15.34,-25.59,-.25,14.92],
// 4 15 -25.06 -.25 15.09 -24.77 -.25 15.3 -24.9 -.25 15.63 -25.31 -.25 15.34
  [4,15,-25.06,-.25,15.09,-24.77,-.25,15.3,-24.9,-.25,15.63,-25.31,-.25,15.34],
// 4 15 -24.77 -.25 -15.3 -25.06 -.25 -15.09 -25.31 -.25 -15.34 -24.9 -.25 -15.63
  [4,15,-24.77,-.25,-15.3,-25.06,-.25,-15.09,-25.31,-.25,-15.34,-24.9,-.25,-15.63],
// 4 15 -25.06 -.25 -15.09 -25.27 -.25 -14.79 -25.59 -.25 -14.92 -25.31 -.25 -15.34
  [4,15,-25.06,-.25,-15.09,-25.27,-.25,-14.79,-25.59,-.25,-14.92,-25.31,-.25,-15.34],
// 4 15 -24.41 -.25 -15.73 24.41 -.25 -15.73 24.41 -.25 -15.37 -24.41 -.25 -15.37
  [4,15,-24.41,-.25,-15.73,24.41,-.25,-15.73,24.41,-.25,-15.37,-24.41,-.25,-15.37],
// 4 15 -24.41 -.25 -15.37 -24.77 -.25 -15.3 -24.9 -.25 -15.63 -24.41 -.25 -15.73
  [4,15,-24.41,-.25,-15.37,-24.77,-.25,-15.3,-24.9,-.25,-15.63,-24.41,-.25,-15.73],
// 4 15 -25.27 -.25 -14.79 -25.34 -.25 -14.42 -25.69 -.25 -14.42 -25.59 -.25 -14.92
  [4,15,-25.27,-.25,-14.79,-25.34,-.25,-14.42,-25.69,-.25,-14.42,-25.59,-.25,-14.92],
// 4 15 25.06 -.25 -15.09 24.77 -.25 -15.3 24.9 -.25 -15.63 25.31 -.25 -15.34
  [4,15,25.06,-.25,-15.09,24.77,-.25,-15.3,24.9,-.25,-15.63,25.31,-.25,-15.34],
// 4 15 24.77 -.25 -15.3 24.41 -.25 -15.37 24.41 -.25 -15.73 24.9 -.25 -15.63
  [4,15,24.77,-.25,-15.3,24.41,-.25,-15.37,24.41,-.25,-15.73,24.9,-.25,-15.63],
// 4 15 25.34 -.25 -14.42 25.27 -.25 -14.79 25.59 -.25 -14.92 25.69 -.25 -14.42
  [4,15,25.34,-.25,-14.42,25.27,-.25,-14.79,25.59,-.25,-14.92,25.69,-.25,-14.42],
// 4 15 25.27 -.25 -14.79 25.06 -.25 -15.09 25.31 -.25 -15.34 25.59 -.25 -14.92
  [4,15,25.27,-.25,-14.79,25.06,-.25,-15.09,25.31,-.25,-15.34,25.59,-.25,-14.92],
// 4 15 -14.8 -.25 9.34 -14.29 -.25 8.03 -11.71 -.25 7.89 -12.1 -.25 9.61
  [4,15,-14.8,-.25,9.34,-14.29,-.25,8.03,-11.71,-.25,7.89,-12.1,-.25,9.61],
// 4 15 -14.29 -.25 5.92 -11.71 -.25 6.18 -11.71 -.25 7.89 -14.29 -.25 8.03
  [4,15,-14.29,-.25,5.92,-11.71,-.25,6.18,-11.71,-.25,7.89,-14.29,-.25,8.03],
// 4 15 -6.6 -.25 7.11 -8.19 -.25 5.69 -4.62 -.25 .65 -1.53 -.25 .65
  [4,15,-6.6,-.25,7.11,-8.19,-.25,5.69,-4.62,-.25,.65,-1.53,-.25,.65],
// 4 15 -10.81 -.25 .65 -8.21 -.25 8.53 -8.17 -.25 13.04 -10.81 -.25 13.04
  [4,15,-10.81,-.25,.65,-8.21,-.25,8.53,-8.17,-.25,13.04,-10.81,-.25,13.04],
// 4 15 -14.8 -.25 9.34 -13.64 -.25 11.85 -15.33 -.25 12.71 -15.7 -.25 10.14
  [4,15,-14.8,-.25,9.34,-13.64,-.25,11.85,-15.33,-.25,12.71,-15.7,-.25,10.14],
// 4 15 -16.86 -.25 10.67 -15.7 -.25 10.14 -15.33 -.25 12.71 -17.21 -.25 13.06
  [4,15,-16.86,-.25,10.67,-15.7,-.25,10.14,-15.33,-.25,12.71,-17.21,-.25,13.06],
// 4 15 -10.06 -.25 -1.35 -11.23 -.25 -1.99 -9.81 -.25 -3.25 -8.37 -.25 -2.98
  [4,15,-10.06,-.25,-1.35,-11.23,-.25,-1.99,-9.81,-.25,-3.25,-8.37,-.25,-2.98],
// 3 15 -6.44 -.25 -4.44 -6.56 -.25 -5.38 -3.84 -.25 -5.5
  [3,15,-6.44,-.25,-4.44,-6.56,-.25,-5.38,-3.84,-.25,-5.5],
// 3 15 -7.22 -.25 -6.44 -9.93 -.25 -8.57 -8.37 -.25 -10.16
  [3,15,-7.22,-.25,-6.44,-9.93,-.25,-8.57,-8.37,-.25,-10.16],
// 3 15 -6.17 -.25 -1.09 -7.34 -.25 -3.11 -6.69 -.25 -3.51
  [3,15,-6.17,-.25,-1.09,-7.34,-.25,-3.11,-6.69,-.25,-3.51],
// 3 15 -4.35 -.25 -2.18 -6.69 -.25 -3.51 -3.84 -.25 -3.25
  [3,15,-4.35,-.25,-2.18,-6.69,-.25,-3.51,-3.84,-.25,-3.25],
// 3 15 5.26 -.25 -2.45 2.29 -.25 -3.32 3.19 -.25 -6.57
  [3,15,5.26,-.25,-2.45,2.29,-.25,-3.32,3.19,-.25,-6.57],
// 3 15 -8.21 -.25 8.53 -8.19 -.25 5.69 -6.6 -.25 7.11
  [3,15,-8.21,-.25,8.53,-8.19,-.25,5.69,-6.6,-.25,7.11],
// 4 15 -17.21 -.25 13.06 -21.81 -.25 13.04 -19.3 -.25 10.79 -16.86 -.25 10.67
  [4,15,-17.21,-.25,13.06,-21.81,-.25,13.04,-19.3,-.25,10.79,-16.86,-.25,10.67],
// 3 15 -8.21 -.25 8.53 -10.81 -.25 .65 -8.19 -.25 5.69
  [3,15,-8.21,-.25,8.53,-10.81,-.25,.65,-8.19,-.25,5.69],
// 4 15 -16.86 -.25 3.02 -17.24 -.25 .65 -15.57 -.25 1.04 -15.45 -.25 3.81
  [4,15,-16.86,-.25,3.02,-17.24,-.25,.65,-15.57,-.25,1.04,-15.45,-.25,3.81],
// 3 15 -15.57 -.25 1.04 -14.03 -.25 1.84 -15.45 -.25 3.81
  [3,15,-15.57,-.25,1.04,-14.03,-.25,1.84,-15.45,-.25,3.81],
// 4 15 -15.45 -.25 3.81 -14.03 -.25 1.84 -12.74 -.25 3.15 -14.55 -.25 4.86
  [4,15,-15.45,-.25,3.81,-14.03,-.25,1.84,-12.74,-.25,3.15,-14.55,-.25,4.86],
// 3 15 -12.74 -.25 3.15 -12.1 -.25 4.47 -14.55 -.25 4.86
  [3,15,-12.74,-.25,3.15,-12.1,-.25,4.47,-14.55,-.25,4.86],
// 3 15 -8.19 -.25 5.69 -10.81 -.25 .65 -8.17 -.25 .65
  [3,15,-8.19,-.25,5.69,-10.81,-.25,.65,-8.17,-.25,.65],
// 3 15 -8.89 -.25 -11.22 -11.75 -.25 -11.48 -11.87 -.25 -13.47
  [3,15,-8.89,-.25,-11.22,-11.75,-.25,-11.48,-11.87,-.25,-13.47],
// 4 15 -8.37 -.25 -10.16 -9.93 -.25 -8.57 -10.97 -.25 -9.76 -8.89 -.25 -10.95
  [4,15,-8.37,-.25,-10.16,-9.93,-.25,-8.57,-10.97,-.25,-9.76,-8.89,-.25,-10.95],
// 4 15 -7.22 -.25 -6.44 -8.37 -.25 -10.16 -5.4 -.25 -7.89 -6.56 -.25 -5.38
  [4,15,-7.22,-.25,-6.44,-8.37,-.25,-10.16,-5.4,-.25,-7.89,-6.56,-.25,-5.38],
// 3 15 -9.81 -.25 -3.25 -11.23 -.25 -1.99 -11.16 -.25 -4.18
  [3,15,-9.81,-.25,-3.25,-11.23,-.25,-1.99,-11.16,-.25,-4.18],
// 4 15 -6.56 -.25 -5.38 -5.4 -.25 -7.89 -4.36 -.25 -6.7 -3.84 -.25 -5.5
  [4,15,-6.56,-.25,-5.38,-5.4,-.25,-7.89,-4.36,-.25,-6.7,-3.84,-.25,-5.5],
// 4 15 -8.89 -.25 -11.22 -8.89 -.25 -10.95 -10.97 -.25 -9.76 -11.75 -.25 -11.48
  [4,15,-8.89,-.25,-11.22,-8.89,-.25,-10.95,-10.97,-.25,-9.76,-11.75,-.25,-11.48],
// 4 15 -3.84 -.25 -3.25 -6.69 -.25 -3.51 -6.44 -.25 -4.44 -3.84 -.25 -5.5
  [4,15,-3.84,-.25,-3.25,-6.69,-.25,-3.51,-6.44,-.25,-4.44,-3.84,-.25,-5.5],
// 4 15 1.51 -.25 -11.74 -.96 -.25 -10.56 -1.47 -.25 -12.81 1.25 -.25 -13.47
  [4,15,1.51,-.25,-11.74,-.96,-.25,-10.56,-1.47,-.25,-12.81,1.25,-.25,-13.47],
// 4 15 2.15 -.25 -9.23 -.05 -.25 -8.03 -.96 -.25 -10.56 1.51 -.25 -11.74
  [4,15,2.15,-.25,-9.23,-.05,-.25,-8.03,-.96,-.25,-10.56,1.51,-.25,-11.74],
// 4 15 -5.01 -.25 -1.62 -6.17 -.25 -1.09 -6.69 -.25 -3.51 -4.35 -.25 -2.18
  [4,15,-5.01,-.25,-1.62,-6.17,-.25,-1.09,-6.69,-.25,-3.51,-4.35,-.25,-2.18],
// 4 15 -6.17 -.25 -1.09 -10.06 -.25 -1.35 -8.37 -.25 -2.98 -7.34 -.25 -3.11
  [4,15,-6.17,-.25,-1.09,-10.06,-.25,-1.35,-8.37,-.25,-2.98,-7.34,-.25,-3.11],
];
module ldraw_lib__6296256o(step=0, col=false, unit=2/5, alt=false, line=0.2, solid=!$preview)
    makepoly(ldraw_lib__6296256o(), step=step, col=col, unit=unit, alt=alt, line=line, solid=solid);
ldraw_lib__6296256o(line=0.2);
